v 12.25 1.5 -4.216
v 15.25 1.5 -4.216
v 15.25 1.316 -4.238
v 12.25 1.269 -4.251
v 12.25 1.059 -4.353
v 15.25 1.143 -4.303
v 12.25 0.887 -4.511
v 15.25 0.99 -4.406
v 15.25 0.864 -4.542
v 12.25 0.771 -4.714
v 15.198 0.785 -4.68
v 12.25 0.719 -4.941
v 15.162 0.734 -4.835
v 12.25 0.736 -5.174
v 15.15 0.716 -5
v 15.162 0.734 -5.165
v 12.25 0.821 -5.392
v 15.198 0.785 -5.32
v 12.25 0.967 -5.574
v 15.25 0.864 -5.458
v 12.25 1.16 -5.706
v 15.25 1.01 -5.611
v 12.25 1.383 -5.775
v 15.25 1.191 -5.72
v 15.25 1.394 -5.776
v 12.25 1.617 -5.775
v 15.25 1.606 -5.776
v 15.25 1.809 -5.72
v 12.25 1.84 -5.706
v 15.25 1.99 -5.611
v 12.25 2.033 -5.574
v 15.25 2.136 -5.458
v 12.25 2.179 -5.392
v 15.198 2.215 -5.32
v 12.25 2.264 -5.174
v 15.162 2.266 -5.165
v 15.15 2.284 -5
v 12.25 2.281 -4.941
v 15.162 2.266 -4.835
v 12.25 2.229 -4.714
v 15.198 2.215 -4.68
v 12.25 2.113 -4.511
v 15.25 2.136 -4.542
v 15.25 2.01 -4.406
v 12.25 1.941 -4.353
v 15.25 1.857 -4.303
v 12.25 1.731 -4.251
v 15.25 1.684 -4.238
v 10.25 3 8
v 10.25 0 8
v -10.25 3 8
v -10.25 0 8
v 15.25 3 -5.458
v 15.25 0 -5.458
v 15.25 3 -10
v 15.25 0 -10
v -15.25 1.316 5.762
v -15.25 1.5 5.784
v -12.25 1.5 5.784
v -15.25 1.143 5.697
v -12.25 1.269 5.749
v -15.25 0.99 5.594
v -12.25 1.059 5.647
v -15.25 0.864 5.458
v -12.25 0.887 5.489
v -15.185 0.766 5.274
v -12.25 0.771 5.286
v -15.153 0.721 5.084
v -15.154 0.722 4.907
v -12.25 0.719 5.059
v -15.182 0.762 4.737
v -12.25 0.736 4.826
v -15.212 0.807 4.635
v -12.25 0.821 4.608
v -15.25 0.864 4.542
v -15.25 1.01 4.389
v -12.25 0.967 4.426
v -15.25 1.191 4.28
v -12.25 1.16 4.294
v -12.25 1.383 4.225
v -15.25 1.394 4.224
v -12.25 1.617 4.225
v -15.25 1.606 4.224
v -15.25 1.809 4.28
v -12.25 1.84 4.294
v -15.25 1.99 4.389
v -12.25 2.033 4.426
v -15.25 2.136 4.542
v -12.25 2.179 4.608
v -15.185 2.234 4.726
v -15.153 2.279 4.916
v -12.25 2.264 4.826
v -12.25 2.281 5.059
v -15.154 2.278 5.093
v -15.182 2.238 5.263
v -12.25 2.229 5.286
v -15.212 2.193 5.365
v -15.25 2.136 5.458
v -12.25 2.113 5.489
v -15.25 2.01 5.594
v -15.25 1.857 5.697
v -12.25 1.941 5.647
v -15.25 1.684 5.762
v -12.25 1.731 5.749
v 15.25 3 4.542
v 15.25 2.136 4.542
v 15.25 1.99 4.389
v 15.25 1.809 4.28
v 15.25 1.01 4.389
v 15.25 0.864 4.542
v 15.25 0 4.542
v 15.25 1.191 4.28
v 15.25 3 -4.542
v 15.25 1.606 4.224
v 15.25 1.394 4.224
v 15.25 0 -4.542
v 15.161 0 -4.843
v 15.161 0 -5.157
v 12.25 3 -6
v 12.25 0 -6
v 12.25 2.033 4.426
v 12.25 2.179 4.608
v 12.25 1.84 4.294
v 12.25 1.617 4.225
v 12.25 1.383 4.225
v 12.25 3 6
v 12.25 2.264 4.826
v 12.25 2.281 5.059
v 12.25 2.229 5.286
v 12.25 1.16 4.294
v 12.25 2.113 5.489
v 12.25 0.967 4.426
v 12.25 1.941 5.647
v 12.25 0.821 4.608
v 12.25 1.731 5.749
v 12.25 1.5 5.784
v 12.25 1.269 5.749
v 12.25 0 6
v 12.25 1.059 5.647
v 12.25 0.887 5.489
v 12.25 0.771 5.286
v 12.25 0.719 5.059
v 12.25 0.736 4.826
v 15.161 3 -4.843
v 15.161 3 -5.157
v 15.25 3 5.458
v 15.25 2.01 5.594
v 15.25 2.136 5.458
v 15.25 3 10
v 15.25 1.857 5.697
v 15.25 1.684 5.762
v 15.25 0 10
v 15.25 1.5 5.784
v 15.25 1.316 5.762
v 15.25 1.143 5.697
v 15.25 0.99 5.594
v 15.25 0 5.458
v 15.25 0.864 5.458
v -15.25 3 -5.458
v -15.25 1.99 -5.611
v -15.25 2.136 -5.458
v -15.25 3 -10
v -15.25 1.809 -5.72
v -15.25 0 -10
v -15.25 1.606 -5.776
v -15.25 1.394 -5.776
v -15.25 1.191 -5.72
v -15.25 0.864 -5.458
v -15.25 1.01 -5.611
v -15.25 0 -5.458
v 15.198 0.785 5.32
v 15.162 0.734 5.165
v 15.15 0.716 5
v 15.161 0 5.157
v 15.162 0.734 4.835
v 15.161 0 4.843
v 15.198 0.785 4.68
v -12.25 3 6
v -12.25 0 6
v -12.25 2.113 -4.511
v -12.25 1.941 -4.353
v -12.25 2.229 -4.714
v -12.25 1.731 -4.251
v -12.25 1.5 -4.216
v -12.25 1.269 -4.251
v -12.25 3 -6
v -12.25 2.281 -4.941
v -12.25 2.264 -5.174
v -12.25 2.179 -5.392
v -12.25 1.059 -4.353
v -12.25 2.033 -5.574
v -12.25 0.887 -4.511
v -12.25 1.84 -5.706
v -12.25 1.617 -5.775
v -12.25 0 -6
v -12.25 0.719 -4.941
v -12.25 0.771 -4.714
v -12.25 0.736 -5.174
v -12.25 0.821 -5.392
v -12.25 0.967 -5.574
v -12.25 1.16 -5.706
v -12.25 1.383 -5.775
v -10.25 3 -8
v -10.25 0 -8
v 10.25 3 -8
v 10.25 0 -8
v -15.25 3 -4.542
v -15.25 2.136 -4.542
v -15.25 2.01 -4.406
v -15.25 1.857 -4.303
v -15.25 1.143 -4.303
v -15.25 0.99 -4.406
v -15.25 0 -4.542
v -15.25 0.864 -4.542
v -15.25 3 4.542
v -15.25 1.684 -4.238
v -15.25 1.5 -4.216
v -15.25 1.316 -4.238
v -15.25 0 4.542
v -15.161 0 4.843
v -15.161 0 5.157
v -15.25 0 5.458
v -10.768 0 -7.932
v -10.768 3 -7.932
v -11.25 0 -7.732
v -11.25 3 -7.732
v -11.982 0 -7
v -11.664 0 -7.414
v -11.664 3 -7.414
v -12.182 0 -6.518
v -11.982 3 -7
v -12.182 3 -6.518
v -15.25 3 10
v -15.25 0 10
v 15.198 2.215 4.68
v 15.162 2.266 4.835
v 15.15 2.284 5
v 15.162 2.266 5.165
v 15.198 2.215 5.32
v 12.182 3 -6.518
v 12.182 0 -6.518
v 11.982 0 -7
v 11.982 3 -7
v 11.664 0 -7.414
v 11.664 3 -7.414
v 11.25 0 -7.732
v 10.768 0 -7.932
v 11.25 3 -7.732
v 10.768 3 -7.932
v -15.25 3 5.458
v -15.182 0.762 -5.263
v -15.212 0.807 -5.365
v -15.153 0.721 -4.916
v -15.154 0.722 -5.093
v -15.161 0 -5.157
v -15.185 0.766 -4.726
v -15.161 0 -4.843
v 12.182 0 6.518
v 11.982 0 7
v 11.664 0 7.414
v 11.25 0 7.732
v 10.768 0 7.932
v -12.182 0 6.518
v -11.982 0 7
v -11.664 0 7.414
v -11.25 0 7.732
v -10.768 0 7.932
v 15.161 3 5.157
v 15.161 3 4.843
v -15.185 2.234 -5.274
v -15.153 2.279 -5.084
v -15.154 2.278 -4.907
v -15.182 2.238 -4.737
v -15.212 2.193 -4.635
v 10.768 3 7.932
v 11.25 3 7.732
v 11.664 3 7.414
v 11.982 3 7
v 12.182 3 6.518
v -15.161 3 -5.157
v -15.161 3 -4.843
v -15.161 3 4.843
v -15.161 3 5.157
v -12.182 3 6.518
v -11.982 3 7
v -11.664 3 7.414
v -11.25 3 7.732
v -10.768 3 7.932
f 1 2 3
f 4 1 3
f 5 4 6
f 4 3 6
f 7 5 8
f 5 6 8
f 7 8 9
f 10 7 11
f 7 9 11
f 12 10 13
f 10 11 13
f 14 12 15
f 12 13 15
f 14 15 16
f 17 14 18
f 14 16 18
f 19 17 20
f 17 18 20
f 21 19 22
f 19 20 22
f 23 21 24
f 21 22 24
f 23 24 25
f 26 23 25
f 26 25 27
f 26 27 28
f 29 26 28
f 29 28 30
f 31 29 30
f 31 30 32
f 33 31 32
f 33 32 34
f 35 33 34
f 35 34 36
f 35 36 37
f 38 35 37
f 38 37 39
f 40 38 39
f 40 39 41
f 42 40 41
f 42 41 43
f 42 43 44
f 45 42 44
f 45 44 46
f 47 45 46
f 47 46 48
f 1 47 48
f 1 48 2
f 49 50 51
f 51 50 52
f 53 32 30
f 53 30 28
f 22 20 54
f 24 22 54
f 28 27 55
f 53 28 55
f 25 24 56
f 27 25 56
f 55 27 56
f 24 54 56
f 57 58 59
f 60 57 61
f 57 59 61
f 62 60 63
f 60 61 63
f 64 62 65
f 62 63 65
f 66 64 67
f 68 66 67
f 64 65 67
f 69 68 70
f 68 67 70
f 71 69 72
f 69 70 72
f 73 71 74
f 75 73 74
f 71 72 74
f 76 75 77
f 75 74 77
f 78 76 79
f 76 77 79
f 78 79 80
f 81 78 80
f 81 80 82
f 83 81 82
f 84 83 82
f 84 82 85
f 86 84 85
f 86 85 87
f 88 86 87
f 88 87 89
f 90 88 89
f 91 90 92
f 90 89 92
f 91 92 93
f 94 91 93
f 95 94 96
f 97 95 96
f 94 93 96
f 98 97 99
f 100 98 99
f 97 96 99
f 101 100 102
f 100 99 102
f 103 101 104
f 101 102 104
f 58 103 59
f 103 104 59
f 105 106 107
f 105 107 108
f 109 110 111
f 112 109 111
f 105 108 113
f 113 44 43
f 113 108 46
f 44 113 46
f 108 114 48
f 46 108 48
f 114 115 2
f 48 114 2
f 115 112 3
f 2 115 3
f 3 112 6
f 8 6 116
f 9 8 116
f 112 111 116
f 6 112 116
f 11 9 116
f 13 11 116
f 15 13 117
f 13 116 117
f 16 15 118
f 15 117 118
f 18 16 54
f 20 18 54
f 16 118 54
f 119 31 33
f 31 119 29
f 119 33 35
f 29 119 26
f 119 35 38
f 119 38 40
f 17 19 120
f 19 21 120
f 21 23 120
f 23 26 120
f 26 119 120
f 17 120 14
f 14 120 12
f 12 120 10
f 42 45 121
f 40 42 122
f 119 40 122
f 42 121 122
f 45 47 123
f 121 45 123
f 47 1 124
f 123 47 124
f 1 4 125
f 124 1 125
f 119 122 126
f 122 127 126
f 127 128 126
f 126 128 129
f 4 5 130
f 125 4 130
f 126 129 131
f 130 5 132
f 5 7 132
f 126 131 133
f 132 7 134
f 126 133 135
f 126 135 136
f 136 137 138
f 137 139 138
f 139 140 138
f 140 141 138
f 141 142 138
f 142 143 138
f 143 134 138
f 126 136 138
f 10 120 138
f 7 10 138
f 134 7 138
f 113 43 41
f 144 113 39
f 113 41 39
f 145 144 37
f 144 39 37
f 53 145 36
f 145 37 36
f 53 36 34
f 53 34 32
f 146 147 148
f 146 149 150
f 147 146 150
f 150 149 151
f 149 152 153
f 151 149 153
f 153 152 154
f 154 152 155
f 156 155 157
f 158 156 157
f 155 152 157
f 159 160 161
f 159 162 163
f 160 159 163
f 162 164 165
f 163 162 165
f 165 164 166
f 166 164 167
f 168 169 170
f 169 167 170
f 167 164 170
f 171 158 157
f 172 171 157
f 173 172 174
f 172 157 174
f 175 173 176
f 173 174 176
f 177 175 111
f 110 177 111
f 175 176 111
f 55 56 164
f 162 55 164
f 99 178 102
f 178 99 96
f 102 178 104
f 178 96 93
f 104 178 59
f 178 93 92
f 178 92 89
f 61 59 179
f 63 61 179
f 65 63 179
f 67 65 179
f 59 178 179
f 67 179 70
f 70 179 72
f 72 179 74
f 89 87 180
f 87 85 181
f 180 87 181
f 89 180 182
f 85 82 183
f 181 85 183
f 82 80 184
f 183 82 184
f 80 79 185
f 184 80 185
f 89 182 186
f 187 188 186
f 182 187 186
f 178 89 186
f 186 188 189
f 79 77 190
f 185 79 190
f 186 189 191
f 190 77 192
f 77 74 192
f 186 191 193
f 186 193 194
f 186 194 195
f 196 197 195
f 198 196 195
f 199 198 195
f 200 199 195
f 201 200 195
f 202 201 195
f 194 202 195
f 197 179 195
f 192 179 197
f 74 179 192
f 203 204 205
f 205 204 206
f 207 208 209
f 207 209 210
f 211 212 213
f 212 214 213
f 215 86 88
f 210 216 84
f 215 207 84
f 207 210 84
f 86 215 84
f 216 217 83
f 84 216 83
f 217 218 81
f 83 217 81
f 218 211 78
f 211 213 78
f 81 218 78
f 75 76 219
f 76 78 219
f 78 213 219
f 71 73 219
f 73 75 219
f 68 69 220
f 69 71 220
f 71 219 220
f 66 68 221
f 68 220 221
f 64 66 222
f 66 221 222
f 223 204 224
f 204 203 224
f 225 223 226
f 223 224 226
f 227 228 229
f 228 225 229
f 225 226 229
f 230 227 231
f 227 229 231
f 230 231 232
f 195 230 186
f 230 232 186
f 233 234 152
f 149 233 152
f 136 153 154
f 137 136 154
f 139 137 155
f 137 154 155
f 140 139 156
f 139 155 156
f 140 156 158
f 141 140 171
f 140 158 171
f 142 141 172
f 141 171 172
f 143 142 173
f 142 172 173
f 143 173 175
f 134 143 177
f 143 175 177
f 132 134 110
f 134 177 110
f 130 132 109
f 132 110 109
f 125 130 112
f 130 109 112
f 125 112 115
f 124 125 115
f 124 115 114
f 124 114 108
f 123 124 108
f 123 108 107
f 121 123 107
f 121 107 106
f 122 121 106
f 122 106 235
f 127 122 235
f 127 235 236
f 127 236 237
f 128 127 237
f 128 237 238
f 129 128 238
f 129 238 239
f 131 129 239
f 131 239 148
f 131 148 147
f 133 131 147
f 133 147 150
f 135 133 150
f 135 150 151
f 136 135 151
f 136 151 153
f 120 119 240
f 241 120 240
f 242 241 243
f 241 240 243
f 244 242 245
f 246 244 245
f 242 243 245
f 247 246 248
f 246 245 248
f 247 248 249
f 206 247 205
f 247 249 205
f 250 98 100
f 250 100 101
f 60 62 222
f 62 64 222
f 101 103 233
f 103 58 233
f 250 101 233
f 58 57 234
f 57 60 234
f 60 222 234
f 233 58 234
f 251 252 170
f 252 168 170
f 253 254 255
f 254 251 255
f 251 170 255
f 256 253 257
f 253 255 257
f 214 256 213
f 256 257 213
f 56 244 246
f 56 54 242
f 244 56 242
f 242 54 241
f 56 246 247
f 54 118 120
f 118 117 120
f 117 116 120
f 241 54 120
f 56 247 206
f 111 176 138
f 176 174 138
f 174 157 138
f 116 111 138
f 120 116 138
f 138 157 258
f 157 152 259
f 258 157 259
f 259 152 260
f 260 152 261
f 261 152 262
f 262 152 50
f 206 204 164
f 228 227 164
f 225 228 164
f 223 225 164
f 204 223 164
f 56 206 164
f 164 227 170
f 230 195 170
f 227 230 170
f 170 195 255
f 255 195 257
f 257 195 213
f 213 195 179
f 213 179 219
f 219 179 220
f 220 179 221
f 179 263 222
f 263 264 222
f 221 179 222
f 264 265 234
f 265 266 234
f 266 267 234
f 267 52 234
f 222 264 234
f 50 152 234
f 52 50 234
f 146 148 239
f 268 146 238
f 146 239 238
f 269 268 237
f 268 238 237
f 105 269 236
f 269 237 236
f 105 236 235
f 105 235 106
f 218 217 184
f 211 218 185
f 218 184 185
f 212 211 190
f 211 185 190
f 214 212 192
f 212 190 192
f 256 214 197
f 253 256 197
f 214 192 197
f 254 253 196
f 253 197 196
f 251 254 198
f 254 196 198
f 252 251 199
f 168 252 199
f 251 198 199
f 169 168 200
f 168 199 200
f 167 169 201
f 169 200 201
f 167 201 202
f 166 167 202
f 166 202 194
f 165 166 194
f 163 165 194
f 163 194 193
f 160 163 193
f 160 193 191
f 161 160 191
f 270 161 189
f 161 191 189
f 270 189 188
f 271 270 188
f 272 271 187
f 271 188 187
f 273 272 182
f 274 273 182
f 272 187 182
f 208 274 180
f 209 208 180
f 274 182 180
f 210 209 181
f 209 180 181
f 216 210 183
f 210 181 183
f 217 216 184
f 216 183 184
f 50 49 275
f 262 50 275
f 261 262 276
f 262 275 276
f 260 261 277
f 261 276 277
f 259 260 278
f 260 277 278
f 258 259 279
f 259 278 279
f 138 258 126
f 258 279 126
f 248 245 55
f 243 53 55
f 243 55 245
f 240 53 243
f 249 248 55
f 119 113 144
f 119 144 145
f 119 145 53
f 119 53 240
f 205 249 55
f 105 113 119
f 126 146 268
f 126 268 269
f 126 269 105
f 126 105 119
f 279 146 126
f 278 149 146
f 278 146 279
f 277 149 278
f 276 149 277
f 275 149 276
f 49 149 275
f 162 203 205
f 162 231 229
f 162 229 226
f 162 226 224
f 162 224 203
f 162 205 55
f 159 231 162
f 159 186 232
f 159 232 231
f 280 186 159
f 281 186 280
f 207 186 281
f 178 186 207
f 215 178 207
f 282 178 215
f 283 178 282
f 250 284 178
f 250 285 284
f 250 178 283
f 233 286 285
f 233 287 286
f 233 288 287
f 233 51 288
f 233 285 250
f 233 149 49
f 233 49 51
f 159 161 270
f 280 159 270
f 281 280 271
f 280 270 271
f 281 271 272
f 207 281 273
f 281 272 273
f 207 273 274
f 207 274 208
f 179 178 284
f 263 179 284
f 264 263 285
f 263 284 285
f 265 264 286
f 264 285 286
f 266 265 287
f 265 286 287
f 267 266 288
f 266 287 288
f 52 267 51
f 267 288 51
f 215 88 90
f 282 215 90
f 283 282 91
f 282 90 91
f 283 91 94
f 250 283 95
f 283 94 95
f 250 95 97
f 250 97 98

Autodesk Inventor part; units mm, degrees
ref_plane "YZ Plane" through (0, 0, 0) normal (1, 0, 0) x (0, 1, 0)
ref_plane "XZ Plane" through (0, 0, 0) normal (0, 1, 0) x (-1, 0, 0)
ref_plane "XY Plane" through (0, 0, 0) normal (0, 0, 1) x (1, 0, 0)
sketch "スケッチ1" plane through (0, 0, 0) normal (0, 1, 0) x (-1, 0, 0)
  line L0 (15.25, 10) -> (-15.25, 10)
  line L1 (-15.25, 10) -> (-15.25, -10)
  line L2 (-15.25, -10) -> (15.25, -10)
  line L3 (15.25, -10) -> (15.25, 10)
  line L4 (15.25, 10) -> (-15.25, -10) construction
  line L5 (-15.25, 10) -> (15.25, -10) construction
  line L6 (12.25, -8) -> (-12.25, -8)
  line L7 (-12.25, -8) -> (-12.25, 8)
  line L8 (-12.25, 8) -> (12.25, 8)
  line L9 (12.25, 8) -> (12.25, -8)
  circle A0 centre (-16.25, -5) radius 1.1
  line L10 (-15.25, 0) -> (15.25, 0) construction
  line L11 (0, 0) -> (0, -10) construction
  circle A1 centre (-16.25, 5) radius 1.1
  circle A2 centre (16.25, -5) radius 1.1
  circle A3 centre (16.25, 5) radius 1.1
  point P0 (0, 0)
  point P1 (-15.25, 5.4583)
  point P2 (-15.25, 4.5417)
  point P3 (-15.25, -4.5417)
  point P4 (-15.25, -5.4583)
  point P5 (15.25, -5.4583)
  point P6 (15.25, -4.5417)
  point P7 (15.25, 4.5417)
  point P8 (15.25, 5.4583)
  dimension "d0" = 30.5
  dimension "d1" = 20
  dimension "d3" = 2.2
  dimension "d4" = 1
  dimension "d5" = 10
  dimension "d16" = 2
  dimension "d17" = 2
  dimension "d18" = 3
  dimension "d19" = 3
extrude "押し出し1" add sketch "スケッチ1" along normal blind 3 contours L3 A3 A2 L2 L1 A0 A1 L0
fillet "フィレット1" radius 2 4 edges at (12.25, 1.5, -8) (12.25, 1.5, 8) (-12.25, 1.5, 8) (-12.25, 1.5, -8)
sketch "スケッチ2" plane through (-15.25, 0, -4.5417) normal (-1, 0, 0) x (0, 0, 1)
  line L0 (10.5417, 3) -> (10.5417, 0)
  line L1 (-1.4583, 0) -> (-1.4583, 3)
  line L2 (-1.4583, 3) -> (-1.4583, 0)
  line L3 (-0.9165, 0) -> (0, 0)
  line L4 (-1.4583, 3) -> (-1.4583, 0) projected
  line L5 (-0.9165, 0) -> (0, 0) projected
  line L6 (9.0835, 0) -> (10, 0) projected
  line L7 (10.5417, 0) -> (10.5417, 3) projected
  point P0 (4.5417, 0)
  point P1 (9.5417, 1.5)
  point P2 (-0.4583, 1.5)
  point P3 (-1.4583, 1.5)
  point P4 (-0.4583, 0)
  point P5 (9.5417, 0)
  point P6 (10.5417, 1.5)
hole "穴1" at (-15.25, 1.5, 5) at (-15.25, 1.5, -5) direction (1, 0, 0) diameter 1.567 end through all thread size "M2x0.4" class "6H" standard "ISO Metric profile"
equation "\"d17\" = d16"
equation "\"d19\" = d18"
properties part number "free_suzikai" material "アルミニウム 2014-T4"
